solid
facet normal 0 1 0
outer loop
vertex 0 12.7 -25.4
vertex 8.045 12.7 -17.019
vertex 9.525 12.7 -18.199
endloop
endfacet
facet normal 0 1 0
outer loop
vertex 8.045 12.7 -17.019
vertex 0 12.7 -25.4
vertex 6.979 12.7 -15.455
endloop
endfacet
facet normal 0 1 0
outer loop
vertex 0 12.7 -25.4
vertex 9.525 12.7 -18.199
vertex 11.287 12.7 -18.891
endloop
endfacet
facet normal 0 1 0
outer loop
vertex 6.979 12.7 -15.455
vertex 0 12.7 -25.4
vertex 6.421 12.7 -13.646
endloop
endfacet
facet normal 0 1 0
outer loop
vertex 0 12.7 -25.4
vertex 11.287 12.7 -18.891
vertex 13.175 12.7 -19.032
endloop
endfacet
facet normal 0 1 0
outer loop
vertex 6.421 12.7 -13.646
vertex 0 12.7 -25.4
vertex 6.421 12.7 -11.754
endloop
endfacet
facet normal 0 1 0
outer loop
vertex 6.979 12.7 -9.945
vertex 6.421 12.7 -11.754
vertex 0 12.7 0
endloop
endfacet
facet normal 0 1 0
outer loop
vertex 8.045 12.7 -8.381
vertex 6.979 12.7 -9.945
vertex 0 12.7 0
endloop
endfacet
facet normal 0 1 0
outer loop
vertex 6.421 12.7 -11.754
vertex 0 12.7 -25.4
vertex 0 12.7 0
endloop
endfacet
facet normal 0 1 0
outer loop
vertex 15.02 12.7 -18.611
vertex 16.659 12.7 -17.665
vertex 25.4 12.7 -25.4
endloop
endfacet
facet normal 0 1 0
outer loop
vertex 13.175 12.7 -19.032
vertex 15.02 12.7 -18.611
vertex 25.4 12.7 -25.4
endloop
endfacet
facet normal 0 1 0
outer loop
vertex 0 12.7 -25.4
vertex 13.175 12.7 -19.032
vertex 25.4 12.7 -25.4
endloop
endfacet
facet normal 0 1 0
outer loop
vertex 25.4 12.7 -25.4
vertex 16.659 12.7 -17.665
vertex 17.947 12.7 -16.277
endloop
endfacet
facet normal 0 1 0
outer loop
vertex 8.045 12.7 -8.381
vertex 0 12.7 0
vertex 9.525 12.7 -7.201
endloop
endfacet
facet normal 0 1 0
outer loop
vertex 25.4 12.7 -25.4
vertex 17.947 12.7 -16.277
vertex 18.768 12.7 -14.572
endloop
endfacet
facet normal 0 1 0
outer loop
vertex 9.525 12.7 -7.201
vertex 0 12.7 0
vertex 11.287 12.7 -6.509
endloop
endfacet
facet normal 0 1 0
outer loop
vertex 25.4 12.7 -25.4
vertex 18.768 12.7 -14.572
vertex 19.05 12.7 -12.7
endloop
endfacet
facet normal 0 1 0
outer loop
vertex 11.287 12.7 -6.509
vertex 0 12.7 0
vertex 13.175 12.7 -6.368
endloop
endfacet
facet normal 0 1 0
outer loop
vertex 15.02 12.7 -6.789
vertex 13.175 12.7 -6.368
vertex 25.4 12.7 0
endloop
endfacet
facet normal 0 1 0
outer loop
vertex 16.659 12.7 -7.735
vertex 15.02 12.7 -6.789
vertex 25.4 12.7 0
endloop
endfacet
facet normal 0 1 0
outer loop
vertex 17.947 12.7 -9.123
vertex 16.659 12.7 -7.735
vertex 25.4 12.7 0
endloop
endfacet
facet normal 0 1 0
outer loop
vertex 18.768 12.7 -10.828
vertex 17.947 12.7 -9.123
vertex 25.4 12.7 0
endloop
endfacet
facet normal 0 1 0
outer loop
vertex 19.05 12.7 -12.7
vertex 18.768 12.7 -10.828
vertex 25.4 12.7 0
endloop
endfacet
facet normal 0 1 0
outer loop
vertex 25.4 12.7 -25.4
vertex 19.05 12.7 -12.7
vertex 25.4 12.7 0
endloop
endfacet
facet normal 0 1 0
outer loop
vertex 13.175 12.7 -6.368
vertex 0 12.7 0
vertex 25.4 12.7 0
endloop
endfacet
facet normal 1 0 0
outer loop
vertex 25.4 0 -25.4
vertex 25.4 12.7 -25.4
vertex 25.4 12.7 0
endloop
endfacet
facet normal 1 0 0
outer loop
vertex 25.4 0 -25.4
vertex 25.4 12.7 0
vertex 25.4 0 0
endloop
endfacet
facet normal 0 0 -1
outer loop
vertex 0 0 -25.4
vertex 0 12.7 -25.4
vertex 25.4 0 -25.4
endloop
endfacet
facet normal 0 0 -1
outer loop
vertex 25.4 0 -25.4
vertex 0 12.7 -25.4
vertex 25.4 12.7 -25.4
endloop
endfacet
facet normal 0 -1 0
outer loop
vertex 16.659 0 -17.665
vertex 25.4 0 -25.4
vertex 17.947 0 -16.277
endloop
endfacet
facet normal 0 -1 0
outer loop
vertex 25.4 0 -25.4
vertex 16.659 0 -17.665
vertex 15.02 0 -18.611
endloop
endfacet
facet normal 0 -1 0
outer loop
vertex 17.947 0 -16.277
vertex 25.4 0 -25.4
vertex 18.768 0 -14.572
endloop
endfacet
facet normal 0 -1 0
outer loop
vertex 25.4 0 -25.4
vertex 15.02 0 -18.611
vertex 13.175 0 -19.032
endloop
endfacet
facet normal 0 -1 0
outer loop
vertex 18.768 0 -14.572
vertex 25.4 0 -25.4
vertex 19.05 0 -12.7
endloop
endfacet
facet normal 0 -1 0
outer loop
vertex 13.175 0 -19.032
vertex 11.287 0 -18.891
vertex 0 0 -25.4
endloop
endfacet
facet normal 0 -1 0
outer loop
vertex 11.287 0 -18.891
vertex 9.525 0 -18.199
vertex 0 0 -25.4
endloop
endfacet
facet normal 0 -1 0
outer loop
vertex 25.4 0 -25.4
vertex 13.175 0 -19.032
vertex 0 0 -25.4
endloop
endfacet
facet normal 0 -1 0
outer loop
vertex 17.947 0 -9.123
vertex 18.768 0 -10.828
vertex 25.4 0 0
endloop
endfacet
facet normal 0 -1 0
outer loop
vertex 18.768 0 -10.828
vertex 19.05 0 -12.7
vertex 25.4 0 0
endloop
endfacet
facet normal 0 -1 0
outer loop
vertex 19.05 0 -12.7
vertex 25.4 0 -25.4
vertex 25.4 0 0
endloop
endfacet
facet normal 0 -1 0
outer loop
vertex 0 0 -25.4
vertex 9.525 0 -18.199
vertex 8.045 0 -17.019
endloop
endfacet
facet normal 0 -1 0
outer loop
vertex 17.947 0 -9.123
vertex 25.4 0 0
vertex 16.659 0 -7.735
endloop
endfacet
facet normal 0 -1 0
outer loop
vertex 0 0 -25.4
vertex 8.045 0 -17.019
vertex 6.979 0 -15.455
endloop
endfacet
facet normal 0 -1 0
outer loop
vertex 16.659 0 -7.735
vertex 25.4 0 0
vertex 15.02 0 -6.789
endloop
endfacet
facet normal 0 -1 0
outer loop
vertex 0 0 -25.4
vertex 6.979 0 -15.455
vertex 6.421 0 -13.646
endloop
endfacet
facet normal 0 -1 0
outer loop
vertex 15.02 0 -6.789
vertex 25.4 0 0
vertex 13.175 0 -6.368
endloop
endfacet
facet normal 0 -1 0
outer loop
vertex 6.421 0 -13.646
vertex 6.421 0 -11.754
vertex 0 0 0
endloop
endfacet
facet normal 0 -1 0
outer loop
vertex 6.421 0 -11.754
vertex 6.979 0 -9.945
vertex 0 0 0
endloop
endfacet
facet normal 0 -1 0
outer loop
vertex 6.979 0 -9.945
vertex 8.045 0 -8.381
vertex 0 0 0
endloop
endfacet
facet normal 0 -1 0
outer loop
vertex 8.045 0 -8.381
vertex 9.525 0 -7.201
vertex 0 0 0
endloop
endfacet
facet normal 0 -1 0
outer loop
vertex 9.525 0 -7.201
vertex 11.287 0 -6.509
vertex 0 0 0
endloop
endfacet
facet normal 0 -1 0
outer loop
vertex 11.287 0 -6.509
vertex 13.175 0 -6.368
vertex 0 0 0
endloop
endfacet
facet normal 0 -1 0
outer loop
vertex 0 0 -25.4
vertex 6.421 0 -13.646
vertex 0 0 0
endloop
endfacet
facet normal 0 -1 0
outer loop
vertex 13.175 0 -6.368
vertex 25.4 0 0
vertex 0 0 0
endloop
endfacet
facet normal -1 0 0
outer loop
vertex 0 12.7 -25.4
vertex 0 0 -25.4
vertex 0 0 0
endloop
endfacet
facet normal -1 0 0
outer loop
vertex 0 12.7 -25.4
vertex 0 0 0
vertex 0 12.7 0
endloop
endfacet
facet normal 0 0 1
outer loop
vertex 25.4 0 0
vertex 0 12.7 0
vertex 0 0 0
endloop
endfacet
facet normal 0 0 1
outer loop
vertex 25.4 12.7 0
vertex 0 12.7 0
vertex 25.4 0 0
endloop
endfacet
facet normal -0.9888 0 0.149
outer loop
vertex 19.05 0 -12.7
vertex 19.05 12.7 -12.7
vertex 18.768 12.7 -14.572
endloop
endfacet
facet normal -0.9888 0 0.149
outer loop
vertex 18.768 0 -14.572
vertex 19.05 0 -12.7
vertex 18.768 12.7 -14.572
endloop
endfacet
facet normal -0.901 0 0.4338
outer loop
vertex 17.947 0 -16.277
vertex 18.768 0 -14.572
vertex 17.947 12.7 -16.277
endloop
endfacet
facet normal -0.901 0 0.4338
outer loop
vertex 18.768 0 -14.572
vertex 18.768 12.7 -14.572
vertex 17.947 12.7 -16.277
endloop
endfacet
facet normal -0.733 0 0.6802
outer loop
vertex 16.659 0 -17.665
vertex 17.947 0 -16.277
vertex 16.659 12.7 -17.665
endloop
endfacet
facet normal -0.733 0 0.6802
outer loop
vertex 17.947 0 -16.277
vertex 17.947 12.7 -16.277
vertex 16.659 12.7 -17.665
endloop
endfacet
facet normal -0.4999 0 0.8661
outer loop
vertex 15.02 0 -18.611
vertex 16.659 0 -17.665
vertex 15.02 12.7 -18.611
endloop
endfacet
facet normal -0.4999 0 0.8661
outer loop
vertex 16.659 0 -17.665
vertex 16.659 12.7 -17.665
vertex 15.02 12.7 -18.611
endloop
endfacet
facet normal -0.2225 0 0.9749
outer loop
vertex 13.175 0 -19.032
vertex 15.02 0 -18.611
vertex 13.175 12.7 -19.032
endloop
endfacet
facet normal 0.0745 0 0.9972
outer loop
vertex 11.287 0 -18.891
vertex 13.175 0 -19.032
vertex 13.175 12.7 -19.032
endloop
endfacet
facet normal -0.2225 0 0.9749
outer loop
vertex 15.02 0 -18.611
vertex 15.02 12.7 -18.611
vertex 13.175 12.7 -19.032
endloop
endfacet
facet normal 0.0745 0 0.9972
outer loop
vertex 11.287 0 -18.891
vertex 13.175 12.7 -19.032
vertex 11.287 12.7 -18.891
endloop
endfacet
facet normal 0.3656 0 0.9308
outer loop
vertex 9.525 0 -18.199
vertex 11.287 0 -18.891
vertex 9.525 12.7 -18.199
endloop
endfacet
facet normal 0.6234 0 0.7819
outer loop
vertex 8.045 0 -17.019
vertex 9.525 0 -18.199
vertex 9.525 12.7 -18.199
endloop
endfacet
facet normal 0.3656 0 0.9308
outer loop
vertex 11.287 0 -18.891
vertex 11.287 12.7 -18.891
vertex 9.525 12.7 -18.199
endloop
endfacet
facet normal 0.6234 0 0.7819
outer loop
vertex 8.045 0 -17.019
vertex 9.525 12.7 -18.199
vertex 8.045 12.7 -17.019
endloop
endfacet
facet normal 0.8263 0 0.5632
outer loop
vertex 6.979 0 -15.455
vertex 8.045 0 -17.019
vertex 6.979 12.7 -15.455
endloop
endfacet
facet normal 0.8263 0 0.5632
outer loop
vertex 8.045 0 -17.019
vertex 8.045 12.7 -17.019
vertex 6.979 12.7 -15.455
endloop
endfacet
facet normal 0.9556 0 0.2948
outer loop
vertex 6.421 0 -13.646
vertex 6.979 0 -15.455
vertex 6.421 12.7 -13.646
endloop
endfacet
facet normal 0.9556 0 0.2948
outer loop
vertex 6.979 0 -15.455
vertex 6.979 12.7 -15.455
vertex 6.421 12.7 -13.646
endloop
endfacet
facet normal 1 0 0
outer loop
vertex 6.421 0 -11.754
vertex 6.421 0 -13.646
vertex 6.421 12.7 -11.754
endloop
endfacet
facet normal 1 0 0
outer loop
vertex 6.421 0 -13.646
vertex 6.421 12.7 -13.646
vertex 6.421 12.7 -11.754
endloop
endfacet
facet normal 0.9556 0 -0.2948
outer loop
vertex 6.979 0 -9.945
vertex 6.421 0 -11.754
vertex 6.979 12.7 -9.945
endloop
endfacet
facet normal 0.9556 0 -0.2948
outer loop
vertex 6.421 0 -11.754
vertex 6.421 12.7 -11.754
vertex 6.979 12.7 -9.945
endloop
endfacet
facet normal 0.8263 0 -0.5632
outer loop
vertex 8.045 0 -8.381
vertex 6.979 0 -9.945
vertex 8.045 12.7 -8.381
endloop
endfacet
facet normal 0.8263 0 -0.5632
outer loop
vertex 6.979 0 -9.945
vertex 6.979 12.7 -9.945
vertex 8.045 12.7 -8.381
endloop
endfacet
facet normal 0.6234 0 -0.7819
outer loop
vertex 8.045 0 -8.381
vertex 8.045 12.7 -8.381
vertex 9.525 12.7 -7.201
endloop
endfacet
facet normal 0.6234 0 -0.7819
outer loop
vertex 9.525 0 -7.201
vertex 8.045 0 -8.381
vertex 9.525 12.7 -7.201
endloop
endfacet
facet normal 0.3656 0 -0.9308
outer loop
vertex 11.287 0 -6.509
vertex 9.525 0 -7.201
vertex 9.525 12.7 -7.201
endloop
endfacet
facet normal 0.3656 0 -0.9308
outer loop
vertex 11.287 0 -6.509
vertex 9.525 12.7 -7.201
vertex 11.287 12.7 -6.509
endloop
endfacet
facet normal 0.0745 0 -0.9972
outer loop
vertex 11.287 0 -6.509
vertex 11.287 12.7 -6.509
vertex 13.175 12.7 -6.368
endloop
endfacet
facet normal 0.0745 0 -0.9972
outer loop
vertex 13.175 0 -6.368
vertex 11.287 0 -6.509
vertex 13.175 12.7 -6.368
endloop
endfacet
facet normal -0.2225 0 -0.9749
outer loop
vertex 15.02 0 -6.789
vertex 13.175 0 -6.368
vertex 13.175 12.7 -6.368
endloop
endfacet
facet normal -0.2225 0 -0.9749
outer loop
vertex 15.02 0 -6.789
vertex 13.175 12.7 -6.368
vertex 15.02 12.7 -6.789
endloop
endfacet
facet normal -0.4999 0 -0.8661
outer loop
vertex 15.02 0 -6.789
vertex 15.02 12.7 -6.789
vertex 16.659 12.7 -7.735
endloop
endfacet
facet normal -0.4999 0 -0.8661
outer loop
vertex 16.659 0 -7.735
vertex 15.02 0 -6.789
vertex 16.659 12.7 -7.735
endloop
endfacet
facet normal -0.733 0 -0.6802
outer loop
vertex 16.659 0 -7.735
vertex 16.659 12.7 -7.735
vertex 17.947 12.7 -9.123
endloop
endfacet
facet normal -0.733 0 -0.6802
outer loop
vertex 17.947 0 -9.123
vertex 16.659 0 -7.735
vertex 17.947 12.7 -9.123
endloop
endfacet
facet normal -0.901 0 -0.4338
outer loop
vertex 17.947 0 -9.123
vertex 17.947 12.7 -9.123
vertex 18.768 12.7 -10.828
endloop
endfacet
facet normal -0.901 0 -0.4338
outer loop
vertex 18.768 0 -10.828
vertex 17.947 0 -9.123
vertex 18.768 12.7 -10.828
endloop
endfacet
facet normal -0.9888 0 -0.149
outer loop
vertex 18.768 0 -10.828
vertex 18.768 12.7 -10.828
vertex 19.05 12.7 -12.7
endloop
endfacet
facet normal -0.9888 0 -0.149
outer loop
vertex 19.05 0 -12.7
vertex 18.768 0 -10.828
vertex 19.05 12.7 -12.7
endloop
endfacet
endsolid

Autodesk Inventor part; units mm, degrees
ref_plane "YZ Plane" through (0, 0, 0) normal (1, 0, 0) x (0, 1, 0)
ref_plane "XZ Plane" through (0, 0, 0) normal (0, 1, 0) x (-1, 0, 0)
ref_plane "XY Plane" through (0, 0, 0) normal (0, 0, 1) x (1, 0, 0)
sketch "Sketch1" plane through (0, 0, 0) normal (0, 0, 1) x (1, 0, 0)
  line L0 (0, 0) -> (0, 12.7)
  line L1 (0, 12.7) -> (25.4, 12.7)
  line L2 (25.4, 12.7) -> (25.4, 0)
  line L3 (25.4, 0) -> (0, 0)
  dimension "d0" = 12.7
  dimension "d1" = 25.4
extrude "Extrusion1" add sketch "Sketch1" against normal blind 25.4
sketch "Sketch2" plane through (0, 12.7, 0) normal (0, 1, 0) x (1, 0, 0)
  line L0 (0, 0) -> (12.7, 0) construction
  line L1 (0, 0) -> (25.4, 0) construction
  line L2 (12.7, 0) -> (12.7, 12.7) construction
  circle A0 centre (12.7, 12.7) radius 6.35
  dimension "d4" = 12.7
  dimension "d5" = 12.7
extrude "Extrusion2" cut sketch "Sketch2" against normal blind 15.875
sketch "Sketch3" plane through (0, 12.7, 0) normal (0, 1, 0) x (1, 0, 0)
  point P0 (0, 0)
